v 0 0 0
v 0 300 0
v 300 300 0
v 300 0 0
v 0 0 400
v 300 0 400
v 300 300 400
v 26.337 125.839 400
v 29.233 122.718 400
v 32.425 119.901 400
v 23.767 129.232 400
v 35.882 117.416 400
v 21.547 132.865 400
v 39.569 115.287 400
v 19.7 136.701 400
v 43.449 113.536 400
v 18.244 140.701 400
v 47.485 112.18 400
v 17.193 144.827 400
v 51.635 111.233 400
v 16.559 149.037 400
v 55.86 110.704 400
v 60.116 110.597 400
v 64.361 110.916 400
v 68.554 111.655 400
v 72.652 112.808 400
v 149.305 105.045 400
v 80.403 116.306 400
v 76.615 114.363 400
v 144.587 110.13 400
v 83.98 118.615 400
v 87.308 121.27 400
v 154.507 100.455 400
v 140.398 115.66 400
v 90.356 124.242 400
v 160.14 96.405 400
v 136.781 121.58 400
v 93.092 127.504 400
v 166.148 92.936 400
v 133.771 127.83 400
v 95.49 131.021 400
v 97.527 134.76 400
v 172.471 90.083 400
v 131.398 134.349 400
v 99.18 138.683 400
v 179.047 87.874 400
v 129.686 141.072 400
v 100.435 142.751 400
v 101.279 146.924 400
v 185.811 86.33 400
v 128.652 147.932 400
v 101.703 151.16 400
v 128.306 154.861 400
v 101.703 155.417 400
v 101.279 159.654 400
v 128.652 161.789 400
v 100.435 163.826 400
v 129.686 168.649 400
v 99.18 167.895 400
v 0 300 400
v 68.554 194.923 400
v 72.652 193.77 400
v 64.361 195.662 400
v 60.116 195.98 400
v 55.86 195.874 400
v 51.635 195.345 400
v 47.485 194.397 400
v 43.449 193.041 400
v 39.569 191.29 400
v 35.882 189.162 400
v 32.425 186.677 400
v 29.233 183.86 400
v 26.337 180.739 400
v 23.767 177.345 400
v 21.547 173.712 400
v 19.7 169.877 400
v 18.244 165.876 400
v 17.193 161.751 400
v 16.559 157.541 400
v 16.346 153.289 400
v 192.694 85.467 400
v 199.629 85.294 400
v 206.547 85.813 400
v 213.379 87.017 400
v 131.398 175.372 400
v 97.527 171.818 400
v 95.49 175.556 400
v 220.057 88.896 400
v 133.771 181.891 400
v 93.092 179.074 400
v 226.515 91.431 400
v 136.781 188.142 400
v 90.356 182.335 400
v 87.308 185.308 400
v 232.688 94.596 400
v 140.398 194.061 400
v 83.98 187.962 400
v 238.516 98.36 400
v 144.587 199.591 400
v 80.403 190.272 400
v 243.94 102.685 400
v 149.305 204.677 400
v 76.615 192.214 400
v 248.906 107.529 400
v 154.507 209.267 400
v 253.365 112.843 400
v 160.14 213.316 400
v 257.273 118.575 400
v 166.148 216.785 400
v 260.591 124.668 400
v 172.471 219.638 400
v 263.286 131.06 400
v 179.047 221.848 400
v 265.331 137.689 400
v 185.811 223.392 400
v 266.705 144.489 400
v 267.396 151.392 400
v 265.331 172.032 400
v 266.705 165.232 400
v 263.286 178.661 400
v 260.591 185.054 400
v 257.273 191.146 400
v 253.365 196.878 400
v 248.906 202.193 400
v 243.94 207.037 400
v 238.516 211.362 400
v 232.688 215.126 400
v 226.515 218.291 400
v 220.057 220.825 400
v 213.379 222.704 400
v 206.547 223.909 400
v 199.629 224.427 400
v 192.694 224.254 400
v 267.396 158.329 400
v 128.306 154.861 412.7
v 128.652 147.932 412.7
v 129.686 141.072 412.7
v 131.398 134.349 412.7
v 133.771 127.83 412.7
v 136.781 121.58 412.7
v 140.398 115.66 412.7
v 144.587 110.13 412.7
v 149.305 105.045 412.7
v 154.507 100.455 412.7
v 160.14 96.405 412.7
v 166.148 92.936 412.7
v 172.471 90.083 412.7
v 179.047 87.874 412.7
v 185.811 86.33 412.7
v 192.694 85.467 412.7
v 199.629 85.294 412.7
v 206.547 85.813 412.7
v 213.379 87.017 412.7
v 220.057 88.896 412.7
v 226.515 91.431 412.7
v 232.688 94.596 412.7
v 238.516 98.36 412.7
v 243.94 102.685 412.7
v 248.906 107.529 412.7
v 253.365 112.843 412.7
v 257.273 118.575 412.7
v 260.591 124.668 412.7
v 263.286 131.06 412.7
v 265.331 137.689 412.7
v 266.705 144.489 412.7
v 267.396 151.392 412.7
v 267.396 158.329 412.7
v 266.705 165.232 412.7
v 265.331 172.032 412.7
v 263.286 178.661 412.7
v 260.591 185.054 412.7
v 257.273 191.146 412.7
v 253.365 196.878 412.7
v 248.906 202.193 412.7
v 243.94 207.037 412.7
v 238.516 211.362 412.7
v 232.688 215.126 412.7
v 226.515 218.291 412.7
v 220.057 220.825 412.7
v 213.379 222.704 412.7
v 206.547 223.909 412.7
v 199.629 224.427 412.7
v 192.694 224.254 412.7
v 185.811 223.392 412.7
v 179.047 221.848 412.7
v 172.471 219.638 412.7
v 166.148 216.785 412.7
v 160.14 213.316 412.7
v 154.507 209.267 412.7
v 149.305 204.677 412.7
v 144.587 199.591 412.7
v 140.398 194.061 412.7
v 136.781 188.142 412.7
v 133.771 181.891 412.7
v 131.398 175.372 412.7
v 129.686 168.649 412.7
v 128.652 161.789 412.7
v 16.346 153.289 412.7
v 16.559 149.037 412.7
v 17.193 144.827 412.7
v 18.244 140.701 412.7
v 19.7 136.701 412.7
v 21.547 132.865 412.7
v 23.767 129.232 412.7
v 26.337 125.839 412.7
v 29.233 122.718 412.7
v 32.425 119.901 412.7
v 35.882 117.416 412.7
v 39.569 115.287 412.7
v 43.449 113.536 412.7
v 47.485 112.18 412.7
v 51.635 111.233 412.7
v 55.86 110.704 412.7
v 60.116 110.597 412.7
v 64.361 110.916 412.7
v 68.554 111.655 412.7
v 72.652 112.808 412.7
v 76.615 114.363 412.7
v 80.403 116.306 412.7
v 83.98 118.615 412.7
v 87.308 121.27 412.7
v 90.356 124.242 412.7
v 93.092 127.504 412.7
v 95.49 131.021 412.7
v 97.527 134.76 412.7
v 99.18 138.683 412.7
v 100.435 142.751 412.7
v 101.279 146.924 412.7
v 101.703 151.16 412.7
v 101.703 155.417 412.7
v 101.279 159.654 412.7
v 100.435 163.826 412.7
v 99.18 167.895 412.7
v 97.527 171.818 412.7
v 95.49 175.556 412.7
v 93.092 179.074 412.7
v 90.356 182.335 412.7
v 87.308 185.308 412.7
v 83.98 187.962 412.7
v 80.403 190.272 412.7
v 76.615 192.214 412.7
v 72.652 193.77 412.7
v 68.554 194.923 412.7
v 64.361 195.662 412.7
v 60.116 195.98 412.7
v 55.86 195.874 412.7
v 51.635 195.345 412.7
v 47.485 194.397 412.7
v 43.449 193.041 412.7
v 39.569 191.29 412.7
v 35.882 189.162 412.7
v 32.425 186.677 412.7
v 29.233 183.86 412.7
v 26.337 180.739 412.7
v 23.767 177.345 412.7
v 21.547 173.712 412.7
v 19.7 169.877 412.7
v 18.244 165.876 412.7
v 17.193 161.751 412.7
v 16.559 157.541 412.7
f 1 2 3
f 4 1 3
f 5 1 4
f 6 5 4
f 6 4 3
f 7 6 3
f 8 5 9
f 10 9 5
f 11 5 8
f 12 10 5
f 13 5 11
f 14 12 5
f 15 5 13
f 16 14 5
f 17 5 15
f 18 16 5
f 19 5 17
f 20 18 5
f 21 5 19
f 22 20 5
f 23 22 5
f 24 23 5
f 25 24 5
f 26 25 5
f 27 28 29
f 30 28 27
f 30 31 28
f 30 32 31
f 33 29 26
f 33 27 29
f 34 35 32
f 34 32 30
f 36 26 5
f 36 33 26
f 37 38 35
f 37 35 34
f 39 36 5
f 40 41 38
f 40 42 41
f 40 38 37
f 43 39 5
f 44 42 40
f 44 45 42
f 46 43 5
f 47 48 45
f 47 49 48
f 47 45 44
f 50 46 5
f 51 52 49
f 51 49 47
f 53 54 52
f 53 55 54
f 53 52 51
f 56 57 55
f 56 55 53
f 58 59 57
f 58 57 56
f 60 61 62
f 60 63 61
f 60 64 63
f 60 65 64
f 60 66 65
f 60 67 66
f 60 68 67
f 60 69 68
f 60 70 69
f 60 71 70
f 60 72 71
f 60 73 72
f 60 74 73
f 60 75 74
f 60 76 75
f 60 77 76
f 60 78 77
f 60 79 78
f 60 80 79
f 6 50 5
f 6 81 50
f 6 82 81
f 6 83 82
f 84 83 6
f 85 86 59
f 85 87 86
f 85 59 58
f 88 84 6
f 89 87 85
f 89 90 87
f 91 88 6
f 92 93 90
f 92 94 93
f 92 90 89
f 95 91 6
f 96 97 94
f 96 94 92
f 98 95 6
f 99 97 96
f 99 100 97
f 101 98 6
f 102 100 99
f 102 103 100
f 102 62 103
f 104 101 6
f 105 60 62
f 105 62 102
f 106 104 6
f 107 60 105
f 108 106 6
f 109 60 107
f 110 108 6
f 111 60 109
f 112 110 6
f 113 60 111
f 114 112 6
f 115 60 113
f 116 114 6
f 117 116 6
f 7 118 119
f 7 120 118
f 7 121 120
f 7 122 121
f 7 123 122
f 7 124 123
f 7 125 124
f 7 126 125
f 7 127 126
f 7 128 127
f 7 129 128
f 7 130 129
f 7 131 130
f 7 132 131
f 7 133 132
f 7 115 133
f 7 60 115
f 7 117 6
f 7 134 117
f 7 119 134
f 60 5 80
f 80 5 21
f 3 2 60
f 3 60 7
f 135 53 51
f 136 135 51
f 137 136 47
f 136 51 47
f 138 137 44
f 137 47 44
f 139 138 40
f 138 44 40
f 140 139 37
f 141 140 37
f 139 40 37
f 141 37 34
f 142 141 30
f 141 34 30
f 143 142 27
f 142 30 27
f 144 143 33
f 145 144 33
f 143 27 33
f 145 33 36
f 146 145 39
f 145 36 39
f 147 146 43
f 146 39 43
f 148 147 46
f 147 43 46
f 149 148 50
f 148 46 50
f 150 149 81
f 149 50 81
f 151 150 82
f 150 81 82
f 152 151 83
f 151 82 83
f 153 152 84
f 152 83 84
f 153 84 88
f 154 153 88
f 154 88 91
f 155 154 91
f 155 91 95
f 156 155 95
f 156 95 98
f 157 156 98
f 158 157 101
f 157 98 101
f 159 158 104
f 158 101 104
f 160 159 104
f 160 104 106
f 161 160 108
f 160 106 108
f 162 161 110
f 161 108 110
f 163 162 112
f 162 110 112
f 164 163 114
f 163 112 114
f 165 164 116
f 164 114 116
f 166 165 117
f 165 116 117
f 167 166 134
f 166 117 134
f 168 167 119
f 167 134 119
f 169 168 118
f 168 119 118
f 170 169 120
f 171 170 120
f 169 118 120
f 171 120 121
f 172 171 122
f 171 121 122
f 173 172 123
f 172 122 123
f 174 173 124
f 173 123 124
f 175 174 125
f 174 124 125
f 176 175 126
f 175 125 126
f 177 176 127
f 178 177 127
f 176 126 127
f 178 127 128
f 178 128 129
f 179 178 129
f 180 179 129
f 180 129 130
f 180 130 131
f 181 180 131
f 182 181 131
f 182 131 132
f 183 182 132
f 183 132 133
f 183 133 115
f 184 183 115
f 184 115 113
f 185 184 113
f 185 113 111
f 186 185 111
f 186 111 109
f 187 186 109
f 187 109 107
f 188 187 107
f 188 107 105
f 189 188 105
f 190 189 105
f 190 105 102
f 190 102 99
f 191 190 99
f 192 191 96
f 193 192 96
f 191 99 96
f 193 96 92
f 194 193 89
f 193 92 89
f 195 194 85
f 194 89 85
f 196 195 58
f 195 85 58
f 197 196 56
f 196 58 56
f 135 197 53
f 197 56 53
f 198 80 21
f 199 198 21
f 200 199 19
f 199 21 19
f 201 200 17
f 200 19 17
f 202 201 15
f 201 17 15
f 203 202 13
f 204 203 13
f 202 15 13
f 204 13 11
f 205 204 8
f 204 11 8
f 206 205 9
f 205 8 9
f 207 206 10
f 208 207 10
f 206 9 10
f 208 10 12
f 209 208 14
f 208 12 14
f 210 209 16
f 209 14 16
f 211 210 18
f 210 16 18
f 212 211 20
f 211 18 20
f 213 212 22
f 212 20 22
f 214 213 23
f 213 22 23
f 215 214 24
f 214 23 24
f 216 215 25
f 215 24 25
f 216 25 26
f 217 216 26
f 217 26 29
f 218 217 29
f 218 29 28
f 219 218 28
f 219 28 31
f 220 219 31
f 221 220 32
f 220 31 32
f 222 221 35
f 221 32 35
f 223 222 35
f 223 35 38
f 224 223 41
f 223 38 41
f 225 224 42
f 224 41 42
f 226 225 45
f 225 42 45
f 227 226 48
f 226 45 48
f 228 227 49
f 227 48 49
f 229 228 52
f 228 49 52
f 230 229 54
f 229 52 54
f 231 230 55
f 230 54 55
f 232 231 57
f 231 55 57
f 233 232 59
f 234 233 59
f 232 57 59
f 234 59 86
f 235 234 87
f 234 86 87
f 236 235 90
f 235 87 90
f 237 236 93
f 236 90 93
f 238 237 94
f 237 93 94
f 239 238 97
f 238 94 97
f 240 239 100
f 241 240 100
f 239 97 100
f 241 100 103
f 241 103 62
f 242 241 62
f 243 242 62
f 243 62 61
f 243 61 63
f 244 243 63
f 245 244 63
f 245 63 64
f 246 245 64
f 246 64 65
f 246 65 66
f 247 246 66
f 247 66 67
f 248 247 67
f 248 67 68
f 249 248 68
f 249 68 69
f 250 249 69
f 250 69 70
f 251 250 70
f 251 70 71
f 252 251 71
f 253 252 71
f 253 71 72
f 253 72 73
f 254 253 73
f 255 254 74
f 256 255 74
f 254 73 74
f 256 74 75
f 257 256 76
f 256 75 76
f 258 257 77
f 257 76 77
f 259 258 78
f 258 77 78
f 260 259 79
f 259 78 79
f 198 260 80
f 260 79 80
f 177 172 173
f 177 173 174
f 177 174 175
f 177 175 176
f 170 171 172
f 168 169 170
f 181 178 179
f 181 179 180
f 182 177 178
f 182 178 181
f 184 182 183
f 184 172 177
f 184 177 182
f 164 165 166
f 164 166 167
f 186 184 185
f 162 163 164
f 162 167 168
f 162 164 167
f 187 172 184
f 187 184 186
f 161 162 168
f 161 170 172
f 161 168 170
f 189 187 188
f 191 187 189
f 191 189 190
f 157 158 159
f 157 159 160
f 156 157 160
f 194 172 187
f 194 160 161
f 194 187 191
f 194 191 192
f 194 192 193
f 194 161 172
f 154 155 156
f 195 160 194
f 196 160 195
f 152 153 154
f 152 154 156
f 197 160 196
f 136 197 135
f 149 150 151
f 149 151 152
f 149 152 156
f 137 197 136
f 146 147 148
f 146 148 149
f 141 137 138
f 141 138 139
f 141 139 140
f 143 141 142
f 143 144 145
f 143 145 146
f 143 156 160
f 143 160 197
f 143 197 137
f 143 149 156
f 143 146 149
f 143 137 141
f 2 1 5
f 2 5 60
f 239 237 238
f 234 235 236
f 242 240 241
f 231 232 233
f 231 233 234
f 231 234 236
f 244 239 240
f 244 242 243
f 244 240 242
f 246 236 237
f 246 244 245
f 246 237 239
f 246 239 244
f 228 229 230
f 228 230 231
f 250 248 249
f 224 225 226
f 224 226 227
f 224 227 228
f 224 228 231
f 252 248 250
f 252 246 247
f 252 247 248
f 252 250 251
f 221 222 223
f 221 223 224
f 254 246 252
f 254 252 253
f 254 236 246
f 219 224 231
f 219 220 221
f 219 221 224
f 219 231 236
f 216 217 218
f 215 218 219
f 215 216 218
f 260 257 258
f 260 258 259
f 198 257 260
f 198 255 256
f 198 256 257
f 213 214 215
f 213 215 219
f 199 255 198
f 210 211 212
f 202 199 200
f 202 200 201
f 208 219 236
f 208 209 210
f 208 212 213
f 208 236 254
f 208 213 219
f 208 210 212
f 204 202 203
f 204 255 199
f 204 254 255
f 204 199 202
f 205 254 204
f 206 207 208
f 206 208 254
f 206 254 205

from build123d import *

# Parameters (mm, degrees)
SKETCH1_W           = 300
SKETCH1_H           = 300
BOSS_EXTRUDE1_DEPTH = 400
SKETCH2_R           = 42.704595991
SKETCH2_R_2         = 69.587993354
BOSS_EXTRUDE2_DEPTH = 12.7


with BuildPart() as part:
    # Sketch1 → Boss-Extrude1 (new body)
    with BuildSketch(Plane.XY):
        with Locations((150, 150)):
            Rectangle(SKETCH1_W, SKETCH1_H)
    extrude(amount=BOSS_EXTRUDE1_DEPTH)

    # Sketch2 → Boss-Extrude2 (add)
    with BuildSketch(Plane.XY.offset(400)):
        with Locations(Location((59.050998503, 153.288809659, 0), (0, 0, 180))):
            Circle(SKETCH2_R)
        with Locations(Location((197.894381645, 154.860769066, 0), (0, 0, 180))):
            Circle(SKETCH2_R_2)
    extrude(amount=BOSS_EXTRUDE2_DEPTH)


solid = part.part
